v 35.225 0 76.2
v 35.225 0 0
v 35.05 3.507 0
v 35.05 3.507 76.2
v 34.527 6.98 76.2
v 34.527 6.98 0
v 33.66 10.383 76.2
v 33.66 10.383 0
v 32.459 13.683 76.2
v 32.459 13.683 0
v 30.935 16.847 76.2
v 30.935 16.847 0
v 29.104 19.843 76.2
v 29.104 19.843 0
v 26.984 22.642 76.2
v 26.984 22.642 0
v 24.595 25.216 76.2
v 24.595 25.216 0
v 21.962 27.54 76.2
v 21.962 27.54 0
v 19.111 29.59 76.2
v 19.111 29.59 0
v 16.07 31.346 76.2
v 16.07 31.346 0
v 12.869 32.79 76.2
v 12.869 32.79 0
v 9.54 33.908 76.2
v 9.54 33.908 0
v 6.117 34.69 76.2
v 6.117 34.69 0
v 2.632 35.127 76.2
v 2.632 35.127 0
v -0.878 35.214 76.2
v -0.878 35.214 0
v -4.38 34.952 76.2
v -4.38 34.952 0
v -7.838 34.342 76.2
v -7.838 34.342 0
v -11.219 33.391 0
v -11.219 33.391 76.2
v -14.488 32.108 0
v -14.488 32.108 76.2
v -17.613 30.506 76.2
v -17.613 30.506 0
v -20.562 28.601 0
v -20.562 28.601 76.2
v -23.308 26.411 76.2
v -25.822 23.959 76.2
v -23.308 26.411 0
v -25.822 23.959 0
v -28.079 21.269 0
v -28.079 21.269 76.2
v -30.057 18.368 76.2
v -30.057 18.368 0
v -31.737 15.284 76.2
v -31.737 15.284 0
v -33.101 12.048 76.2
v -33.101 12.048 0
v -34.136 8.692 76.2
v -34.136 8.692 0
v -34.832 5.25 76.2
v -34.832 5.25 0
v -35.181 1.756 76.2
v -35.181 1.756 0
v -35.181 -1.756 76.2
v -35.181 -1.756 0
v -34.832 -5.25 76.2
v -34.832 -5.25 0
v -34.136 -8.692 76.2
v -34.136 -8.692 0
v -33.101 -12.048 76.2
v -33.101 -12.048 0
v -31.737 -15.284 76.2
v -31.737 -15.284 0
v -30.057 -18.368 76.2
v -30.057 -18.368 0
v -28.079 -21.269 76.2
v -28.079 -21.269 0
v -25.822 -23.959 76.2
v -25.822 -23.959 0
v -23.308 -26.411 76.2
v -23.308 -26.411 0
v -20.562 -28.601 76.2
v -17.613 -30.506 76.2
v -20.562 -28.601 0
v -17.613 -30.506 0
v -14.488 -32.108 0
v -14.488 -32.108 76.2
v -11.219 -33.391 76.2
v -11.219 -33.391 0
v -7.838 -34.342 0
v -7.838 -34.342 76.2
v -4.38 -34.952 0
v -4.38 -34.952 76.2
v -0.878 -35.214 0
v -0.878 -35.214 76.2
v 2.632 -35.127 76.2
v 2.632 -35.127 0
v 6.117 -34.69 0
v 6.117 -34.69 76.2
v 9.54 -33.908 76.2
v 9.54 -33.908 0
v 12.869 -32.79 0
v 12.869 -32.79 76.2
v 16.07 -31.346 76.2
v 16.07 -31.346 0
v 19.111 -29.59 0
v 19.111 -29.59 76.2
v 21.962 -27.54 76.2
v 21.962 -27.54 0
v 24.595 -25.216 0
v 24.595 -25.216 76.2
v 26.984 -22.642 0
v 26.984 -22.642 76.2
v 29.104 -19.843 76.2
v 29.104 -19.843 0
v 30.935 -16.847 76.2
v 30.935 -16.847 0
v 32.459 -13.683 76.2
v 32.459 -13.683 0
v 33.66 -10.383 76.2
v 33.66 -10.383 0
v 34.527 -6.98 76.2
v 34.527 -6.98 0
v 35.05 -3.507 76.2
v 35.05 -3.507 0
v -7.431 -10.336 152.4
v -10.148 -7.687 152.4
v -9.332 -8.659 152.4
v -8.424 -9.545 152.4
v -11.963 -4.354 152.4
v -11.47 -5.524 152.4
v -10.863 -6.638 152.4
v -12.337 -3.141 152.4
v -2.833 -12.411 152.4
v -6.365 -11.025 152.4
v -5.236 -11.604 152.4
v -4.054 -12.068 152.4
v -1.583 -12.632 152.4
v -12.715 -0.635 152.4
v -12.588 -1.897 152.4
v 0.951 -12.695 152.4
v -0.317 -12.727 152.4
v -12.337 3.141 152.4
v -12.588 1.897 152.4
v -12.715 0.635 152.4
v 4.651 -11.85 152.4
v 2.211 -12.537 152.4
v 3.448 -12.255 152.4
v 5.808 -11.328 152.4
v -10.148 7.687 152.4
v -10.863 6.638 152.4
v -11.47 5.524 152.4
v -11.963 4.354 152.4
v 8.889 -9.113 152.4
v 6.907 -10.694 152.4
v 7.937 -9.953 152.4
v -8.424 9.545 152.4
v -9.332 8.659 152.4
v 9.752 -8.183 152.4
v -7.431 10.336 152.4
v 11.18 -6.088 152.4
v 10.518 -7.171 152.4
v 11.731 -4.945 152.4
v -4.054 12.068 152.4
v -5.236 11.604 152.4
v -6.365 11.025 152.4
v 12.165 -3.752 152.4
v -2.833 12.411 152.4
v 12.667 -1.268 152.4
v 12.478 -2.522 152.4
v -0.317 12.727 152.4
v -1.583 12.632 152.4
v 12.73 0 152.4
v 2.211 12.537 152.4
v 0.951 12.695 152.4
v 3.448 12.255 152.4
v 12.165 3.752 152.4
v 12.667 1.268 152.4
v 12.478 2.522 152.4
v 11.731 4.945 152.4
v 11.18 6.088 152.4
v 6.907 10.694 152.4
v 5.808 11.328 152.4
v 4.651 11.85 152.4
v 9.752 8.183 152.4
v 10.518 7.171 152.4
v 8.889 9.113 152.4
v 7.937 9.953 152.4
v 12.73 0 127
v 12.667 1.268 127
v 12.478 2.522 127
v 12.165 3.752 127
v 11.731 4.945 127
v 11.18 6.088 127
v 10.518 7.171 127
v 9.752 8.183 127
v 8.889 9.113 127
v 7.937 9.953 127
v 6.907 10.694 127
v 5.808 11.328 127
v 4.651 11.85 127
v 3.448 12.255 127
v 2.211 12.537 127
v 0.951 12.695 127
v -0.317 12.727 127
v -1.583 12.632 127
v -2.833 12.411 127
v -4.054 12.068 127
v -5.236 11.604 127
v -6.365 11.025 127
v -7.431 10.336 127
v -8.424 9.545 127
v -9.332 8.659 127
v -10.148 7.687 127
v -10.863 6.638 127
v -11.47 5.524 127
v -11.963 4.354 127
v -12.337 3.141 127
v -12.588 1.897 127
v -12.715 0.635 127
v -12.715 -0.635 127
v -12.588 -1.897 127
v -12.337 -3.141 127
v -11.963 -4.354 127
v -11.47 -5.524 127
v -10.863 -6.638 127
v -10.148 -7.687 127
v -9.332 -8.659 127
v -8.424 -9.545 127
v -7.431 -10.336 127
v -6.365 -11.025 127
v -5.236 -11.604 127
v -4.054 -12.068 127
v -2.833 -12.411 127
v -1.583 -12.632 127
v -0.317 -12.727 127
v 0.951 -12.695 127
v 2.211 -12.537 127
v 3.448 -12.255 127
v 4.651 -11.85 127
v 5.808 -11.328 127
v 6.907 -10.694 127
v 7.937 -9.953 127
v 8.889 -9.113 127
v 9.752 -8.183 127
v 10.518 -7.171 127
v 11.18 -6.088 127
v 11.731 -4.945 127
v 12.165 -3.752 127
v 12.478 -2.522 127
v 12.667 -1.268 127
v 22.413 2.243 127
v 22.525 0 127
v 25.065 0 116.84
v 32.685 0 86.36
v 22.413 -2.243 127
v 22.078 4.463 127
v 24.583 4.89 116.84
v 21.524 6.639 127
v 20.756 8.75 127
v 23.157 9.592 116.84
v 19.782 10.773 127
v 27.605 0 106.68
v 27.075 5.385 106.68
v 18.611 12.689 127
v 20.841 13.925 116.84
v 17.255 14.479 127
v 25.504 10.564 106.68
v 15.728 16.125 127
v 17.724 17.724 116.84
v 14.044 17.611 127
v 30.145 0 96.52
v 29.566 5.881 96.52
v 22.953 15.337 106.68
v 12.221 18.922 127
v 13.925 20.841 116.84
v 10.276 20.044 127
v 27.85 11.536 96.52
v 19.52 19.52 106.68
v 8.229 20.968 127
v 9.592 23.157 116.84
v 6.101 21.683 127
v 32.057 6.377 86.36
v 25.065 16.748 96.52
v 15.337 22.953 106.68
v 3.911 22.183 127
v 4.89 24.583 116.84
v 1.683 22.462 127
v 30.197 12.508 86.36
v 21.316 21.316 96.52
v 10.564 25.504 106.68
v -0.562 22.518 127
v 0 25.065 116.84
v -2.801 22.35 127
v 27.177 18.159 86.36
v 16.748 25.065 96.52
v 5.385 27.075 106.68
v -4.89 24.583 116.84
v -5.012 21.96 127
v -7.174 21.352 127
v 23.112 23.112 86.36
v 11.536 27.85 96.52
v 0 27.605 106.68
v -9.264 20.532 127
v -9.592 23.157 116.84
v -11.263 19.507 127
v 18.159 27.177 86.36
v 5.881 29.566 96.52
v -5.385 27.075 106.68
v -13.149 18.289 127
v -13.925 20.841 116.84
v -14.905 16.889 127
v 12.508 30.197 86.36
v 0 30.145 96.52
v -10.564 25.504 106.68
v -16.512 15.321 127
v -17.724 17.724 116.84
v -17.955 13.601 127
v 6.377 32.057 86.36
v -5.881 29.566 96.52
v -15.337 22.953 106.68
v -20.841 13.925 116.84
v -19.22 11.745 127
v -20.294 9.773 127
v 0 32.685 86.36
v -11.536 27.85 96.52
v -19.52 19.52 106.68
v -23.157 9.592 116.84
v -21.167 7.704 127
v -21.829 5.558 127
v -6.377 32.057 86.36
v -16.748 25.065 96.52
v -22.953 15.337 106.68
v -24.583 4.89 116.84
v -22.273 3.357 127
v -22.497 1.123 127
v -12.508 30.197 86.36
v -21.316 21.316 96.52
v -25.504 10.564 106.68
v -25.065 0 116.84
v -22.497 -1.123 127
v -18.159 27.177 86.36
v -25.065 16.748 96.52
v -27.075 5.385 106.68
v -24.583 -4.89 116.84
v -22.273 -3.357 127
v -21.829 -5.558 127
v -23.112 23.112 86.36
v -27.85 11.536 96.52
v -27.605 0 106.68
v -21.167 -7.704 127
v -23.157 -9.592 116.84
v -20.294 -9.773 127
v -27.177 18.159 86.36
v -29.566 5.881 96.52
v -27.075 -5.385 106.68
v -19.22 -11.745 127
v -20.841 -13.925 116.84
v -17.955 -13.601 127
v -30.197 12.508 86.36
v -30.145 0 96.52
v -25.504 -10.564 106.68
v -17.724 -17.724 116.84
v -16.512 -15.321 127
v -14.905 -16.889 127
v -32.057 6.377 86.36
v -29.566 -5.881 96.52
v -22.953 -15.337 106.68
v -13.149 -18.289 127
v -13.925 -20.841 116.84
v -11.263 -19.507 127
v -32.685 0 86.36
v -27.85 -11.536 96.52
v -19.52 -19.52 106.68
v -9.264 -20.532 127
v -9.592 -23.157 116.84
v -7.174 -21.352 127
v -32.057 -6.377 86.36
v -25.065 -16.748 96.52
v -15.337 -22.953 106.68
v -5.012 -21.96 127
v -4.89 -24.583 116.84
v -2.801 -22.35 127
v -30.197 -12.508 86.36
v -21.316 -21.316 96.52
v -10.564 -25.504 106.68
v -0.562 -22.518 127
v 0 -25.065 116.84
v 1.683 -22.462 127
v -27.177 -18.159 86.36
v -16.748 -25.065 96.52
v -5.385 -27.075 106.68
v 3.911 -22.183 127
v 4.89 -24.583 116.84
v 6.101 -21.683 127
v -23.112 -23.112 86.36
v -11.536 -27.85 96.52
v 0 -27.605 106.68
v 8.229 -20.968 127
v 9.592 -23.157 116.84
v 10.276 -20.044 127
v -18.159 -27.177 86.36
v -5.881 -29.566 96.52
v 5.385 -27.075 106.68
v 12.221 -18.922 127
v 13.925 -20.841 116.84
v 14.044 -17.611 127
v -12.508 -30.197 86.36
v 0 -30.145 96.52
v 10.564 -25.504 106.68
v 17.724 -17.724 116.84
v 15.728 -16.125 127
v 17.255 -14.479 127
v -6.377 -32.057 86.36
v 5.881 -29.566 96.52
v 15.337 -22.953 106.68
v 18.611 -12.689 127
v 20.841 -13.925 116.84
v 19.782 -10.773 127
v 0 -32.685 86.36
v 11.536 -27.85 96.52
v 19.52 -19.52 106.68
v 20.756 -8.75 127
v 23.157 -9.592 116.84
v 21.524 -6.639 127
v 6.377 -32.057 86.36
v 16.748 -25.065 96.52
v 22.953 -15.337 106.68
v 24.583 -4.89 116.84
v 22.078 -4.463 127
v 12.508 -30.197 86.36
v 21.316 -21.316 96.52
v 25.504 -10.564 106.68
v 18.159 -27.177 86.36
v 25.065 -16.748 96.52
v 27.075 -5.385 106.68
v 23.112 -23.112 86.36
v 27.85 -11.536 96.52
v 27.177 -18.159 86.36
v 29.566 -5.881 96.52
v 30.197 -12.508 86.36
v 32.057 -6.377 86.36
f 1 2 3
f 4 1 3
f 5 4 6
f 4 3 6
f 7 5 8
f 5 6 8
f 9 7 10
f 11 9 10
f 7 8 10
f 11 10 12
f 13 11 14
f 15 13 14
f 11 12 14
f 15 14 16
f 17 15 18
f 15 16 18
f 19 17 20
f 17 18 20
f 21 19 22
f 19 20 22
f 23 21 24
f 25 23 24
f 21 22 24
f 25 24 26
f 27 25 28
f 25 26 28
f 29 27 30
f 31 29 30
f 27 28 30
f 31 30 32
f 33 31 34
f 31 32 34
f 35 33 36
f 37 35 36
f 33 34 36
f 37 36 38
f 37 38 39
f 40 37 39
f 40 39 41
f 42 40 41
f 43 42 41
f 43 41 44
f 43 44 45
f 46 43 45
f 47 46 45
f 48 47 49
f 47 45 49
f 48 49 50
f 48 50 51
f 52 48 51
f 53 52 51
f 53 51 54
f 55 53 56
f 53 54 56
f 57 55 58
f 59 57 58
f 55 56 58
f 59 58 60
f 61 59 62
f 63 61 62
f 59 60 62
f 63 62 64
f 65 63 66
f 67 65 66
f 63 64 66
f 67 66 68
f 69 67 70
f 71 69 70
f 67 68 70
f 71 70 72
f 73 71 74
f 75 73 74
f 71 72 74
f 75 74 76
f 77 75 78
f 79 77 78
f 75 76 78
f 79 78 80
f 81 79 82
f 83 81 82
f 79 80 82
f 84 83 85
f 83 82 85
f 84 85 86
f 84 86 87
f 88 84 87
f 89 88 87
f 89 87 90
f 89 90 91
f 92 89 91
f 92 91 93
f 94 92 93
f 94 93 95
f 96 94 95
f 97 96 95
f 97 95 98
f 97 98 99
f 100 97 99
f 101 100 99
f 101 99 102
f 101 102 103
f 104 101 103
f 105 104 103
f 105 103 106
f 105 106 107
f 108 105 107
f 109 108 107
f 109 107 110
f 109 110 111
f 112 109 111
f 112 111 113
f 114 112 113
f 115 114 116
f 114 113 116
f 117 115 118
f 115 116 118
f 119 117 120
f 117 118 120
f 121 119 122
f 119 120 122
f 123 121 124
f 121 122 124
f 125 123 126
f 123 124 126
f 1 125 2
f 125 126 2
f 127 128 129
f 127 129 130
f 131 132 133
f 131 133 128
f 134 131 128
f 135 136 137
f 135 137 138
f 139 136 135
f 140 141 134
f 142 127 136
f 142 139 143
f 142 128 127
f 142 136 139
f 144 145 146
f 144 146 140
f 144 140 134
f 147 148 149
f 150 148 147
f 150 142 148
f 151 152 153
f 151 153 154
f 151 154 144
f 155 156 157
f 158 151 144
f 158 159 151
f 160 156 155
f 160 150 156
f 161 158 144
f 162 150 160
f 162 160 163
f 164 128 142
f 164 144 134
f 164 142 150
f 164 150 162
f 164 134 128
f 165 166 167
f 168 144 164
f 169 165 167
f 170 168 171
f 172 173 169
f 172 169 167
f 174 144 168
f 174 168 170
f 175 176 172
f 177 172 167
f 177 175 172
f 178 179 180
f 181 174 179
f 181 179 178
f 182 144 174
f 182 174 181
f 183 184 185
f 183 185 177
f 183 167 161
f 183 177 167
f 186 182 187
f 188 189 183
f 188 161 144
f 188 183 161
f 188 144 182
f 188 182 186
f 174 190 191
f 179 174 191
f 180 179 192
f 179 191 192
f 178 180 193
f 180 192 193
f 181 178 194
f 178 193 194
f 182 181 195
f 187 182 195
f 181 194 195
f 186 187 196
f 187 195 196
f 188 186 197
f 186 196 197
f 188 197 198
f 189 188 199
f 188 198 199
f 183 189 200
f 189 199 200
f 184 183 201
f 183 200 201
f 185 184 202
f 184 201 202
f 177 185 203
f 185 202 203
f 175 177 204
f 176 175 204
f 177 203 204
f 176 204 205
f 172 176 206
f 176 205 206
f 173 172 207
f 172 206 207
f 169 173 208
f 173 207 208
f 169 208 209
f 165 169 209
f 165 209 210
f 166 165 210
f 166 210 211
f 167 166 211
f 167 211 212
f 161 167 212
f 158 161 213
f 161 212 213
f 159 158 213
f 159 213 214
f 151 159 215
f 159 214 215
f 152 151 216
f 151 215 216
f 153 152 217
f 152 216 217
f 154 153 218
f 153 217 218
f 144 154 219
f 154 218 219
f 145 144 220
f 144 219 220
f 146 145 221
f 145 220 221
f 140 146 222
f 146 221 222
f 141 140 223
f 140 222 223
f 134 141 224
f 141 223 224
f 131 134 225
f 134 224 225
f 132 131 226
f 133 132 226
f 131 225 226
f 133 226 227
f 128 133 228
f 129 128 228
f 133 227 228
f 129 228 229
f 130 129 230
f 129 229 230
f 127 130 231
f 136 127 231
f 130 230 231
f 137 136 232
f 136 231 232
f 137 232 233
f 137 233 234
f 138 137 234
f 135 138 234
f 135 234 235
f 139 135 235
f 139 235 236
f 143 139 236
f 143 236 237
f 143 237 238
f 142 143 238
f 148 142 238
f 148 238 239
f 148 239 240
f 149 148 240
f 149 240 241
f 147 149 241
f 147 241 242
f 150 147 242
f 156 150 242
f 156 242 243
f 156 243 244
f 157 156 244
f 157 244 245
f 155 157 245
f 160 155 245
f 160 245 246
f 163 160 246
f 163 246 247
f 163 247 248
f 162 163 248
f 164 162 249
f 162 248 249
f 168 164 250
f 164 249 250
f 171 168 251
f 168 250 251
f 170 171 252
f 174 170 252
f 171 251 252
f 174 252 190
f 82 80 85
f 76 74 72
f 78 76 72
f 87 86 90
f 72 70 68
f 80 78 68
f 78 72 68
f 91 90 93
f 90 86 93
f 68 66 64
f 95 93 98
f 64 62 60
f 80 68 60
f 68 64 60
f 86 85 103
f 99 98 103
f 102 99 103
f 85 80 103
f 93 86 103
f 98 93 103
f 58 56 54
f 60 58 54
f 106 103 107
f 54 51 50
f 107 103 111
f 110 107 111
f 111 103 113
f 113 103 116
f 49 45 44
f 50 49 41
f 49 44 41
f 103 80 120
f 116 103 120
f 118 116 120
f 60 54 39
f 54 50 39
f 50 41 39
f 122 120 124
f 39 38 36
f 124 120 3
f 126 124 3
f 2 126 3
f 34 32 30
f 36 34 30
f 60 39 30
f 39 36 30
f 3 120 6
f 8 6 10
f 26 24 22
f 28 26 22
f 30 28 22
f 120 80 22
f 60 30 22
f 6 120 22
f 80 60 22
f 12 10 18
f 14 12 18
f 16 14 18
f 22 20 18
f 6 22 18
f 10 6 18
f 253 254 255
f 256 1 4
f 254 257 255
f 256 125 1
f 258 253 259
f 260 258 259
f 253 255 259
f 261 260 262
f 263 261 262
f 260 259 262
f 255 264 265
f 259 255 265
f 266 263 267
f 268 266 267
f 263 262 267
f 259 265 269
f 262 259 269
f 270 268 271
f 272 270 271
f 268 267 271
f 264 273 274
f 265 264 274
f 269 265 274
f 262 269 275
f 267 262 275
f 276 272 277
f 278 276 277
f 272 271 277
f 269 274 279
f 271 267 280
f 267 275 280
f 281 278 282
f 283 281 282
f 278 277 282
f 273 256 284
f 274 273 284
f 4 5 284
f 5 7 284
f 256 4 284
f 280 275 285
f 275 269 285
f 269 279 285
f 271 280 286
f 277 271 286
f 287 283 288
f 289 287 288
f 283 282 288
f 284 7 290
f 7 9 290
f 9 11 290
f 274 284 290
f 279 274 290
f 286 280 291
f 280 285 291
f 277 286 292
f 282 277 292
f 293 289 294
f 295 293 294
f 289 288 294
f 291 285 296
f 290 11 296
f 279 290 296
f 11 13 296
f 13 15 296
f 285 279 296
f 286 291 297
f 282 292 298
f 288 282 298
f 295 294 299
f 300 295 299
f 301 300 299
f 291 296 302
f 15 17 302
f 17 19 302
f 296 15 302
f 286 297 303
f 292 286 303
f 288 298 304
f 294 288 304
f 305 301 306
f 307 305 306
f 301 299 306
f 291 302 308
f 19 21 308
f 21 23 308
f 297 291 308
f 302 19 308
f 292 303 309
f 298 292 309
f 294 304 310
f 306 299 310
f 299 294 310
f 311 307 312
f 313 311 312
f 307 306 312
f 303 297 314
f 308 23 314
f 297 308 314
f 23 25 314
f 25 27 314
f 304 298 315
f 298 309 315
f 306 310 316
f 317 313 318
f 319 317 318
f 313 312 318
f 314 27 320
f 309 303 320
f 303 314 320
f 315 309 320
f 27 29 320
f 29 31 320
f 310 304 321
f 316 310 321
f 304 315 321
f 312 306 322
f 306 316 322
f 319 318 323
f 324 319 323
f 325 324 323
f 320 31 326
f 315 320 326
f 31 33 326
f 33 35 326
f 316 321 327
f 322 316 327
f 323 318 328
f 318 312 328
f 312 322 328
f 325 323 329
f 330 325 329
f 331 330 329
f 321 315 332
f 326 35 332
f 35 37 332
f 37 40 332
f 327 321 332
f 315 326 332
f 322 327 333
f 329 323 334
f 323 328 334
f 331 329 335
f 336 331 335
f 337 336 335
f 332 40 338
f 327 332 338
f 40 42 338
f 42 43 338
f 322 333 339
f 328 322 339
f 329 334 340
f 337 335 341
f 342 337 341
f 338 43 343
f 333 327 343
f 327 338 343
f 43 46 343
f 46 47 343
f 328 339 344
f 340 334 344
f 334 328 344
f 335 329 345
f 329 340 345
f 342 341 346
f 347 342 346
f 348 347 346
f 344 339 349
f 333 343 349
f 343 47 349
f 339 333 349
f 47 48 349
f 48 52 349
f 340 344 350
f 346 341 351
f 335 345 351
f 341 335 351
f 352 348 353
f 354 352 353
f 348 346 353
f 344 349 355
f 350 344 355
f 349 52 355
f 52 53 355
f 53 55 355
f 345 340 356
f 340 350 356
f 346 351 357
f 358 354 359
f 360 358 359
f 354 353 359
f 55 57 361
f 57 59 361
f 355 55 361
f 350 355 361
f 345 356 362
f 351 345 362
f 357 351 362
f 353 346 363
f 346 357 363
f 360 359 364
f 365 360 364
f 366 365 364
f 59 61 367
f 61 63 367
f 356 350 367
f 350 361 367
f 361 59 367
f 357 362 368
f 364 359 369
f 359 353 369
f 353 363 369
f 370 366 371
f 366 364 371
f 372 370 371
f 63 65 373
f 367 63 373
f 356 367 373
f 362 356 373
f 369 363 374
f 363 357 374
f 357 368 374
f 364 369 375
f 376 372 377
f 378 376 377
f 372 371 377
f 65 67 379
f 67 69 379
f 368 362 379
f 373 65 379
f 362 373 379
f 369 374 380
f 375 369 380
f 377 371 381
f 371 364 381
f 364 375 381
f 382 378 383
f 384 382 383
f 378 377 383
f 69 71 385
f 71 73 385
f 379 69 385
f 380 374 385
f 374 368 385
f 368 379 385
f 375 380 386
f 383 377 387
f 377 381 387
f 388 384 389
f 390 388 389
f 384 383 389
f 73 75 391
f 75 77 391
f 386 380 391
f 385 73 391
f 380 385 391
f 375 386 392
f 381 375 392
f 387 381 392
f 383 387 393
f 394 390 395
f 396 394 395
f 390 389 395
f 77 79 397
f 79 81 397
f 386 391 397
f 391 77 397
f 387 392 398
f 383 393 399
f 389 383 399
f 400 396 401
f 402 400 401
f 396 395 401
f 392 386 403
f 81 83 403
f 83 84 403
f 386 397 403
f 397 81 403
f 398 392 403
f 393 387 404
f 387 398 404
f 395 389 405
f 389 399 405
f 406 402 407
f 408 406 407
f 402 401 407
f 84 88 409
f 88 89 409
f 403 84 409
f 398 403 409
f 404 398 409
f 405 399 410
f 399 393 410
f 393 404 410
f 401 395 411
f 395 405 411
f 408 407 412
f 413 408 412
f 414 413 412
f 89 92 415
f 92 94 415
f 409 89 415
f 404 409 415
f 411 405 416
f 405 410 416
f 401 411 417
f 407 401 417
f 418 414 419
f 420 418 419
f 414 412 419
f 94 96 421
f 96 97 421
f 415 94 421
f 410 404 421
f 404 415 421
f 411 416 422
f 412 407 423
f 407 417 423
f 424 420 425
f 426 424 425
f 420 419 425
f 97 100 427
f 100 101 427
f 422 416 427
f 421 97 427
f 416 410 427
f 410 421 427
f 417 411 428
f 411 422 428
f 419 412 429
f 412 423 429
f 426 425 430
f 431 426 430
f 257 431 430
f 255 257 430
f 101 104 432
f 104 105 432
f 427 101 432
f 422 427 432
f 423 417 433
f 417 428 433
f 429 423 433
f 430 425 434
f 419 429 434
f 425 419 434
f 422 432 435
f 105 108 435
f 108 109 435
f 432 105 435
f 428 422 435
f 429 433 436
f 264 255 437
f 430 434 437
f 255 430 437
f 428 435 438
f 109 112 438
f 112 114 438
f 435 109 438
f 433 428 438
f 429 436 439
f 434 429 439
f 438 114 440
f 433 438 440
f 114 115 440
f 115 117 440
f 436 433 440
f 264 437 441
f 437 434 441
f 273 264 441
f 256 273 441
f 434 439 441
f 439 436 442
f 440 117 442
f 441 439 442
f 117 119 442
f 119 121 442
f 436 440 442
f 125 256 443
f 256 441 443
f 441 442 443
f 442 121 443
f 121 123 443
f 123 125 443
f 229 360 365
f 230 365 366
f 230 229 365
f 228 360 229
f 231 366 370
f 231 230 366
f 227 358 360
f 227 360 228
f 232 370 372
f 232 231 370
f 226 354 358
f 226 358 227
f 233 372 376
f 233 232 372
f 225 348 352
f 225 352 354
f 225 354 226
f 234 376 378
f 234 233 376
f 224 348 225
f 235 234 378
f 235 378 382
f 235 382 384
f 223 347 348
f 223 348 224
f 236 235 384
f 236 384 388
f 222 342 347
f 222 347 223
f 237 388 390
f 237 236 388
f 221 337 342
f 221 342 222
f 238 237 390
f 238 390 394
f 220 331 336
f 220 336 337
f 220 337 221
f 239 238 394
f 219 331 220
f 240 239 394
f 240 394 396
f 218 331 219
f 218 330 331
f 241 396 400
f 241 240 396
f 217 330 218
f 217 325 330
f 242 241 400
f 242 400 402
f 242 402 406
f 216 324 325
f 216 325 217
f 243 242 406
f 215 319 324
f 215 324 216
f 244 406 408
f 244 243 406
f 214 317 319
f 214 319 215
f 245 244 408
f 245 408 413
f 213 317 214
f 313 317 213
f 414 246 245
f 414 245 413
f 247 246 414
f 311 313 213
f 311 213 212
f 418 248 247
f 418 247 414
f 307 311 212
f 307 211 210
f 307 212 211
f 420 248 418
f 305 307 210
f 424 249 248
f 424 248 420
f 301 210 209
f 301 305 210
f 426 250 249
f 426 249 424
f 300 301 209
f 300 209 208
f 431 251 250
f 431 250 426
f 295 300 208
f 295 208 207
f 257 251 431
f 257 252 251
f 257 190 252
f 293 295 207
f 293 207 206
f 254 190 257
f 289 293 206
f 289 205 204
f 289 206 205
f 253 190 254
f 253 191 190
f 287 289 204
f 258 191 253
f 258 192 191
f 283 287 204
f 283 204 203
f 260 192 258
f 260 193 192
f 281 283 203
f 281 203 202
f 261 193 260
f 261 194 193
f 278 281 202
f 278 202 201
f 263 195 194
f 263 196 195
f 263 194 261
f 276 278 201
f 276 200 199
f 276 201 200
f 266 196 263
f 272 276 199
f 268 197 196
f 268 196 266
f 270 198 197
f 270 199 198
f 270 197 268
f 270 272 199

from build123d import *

# Parameters (mm, degrees)
F0_R     = 35.2250481383
F1_DEPTH = 127
F2_SIZE2 = 50.8
F2_SIZE  = 12.7
F3_R     = 12.730483267
F4_DEPTH = 25.4


with BuildPart() as f1:
    # F0 (on Top) → F1 (new body)
    with BuildSketch(Plane.XY):
        Circle(F0_R)
    extrude(amount=F1_DEPTH)

    # F2
    f2_edges = [f1.edges().sort_by_distance(p)[0] for p in [
        (-35.225048, 0, 127),
    ]]
    f2_side = f1.faces().sort_by_distance((0, 0, 127))[0]
    chamfer(f2_edges, length=F2_SIZE, length2=F2_SIZE2, reference=f2_side)

    # F3 (on face) → F4 (join)
    with BuildSketch(Plane.XY.offset(127)):
        Circle(F3_R)
    extrude(amount=F4_DEPTH)


solid = f1.part
